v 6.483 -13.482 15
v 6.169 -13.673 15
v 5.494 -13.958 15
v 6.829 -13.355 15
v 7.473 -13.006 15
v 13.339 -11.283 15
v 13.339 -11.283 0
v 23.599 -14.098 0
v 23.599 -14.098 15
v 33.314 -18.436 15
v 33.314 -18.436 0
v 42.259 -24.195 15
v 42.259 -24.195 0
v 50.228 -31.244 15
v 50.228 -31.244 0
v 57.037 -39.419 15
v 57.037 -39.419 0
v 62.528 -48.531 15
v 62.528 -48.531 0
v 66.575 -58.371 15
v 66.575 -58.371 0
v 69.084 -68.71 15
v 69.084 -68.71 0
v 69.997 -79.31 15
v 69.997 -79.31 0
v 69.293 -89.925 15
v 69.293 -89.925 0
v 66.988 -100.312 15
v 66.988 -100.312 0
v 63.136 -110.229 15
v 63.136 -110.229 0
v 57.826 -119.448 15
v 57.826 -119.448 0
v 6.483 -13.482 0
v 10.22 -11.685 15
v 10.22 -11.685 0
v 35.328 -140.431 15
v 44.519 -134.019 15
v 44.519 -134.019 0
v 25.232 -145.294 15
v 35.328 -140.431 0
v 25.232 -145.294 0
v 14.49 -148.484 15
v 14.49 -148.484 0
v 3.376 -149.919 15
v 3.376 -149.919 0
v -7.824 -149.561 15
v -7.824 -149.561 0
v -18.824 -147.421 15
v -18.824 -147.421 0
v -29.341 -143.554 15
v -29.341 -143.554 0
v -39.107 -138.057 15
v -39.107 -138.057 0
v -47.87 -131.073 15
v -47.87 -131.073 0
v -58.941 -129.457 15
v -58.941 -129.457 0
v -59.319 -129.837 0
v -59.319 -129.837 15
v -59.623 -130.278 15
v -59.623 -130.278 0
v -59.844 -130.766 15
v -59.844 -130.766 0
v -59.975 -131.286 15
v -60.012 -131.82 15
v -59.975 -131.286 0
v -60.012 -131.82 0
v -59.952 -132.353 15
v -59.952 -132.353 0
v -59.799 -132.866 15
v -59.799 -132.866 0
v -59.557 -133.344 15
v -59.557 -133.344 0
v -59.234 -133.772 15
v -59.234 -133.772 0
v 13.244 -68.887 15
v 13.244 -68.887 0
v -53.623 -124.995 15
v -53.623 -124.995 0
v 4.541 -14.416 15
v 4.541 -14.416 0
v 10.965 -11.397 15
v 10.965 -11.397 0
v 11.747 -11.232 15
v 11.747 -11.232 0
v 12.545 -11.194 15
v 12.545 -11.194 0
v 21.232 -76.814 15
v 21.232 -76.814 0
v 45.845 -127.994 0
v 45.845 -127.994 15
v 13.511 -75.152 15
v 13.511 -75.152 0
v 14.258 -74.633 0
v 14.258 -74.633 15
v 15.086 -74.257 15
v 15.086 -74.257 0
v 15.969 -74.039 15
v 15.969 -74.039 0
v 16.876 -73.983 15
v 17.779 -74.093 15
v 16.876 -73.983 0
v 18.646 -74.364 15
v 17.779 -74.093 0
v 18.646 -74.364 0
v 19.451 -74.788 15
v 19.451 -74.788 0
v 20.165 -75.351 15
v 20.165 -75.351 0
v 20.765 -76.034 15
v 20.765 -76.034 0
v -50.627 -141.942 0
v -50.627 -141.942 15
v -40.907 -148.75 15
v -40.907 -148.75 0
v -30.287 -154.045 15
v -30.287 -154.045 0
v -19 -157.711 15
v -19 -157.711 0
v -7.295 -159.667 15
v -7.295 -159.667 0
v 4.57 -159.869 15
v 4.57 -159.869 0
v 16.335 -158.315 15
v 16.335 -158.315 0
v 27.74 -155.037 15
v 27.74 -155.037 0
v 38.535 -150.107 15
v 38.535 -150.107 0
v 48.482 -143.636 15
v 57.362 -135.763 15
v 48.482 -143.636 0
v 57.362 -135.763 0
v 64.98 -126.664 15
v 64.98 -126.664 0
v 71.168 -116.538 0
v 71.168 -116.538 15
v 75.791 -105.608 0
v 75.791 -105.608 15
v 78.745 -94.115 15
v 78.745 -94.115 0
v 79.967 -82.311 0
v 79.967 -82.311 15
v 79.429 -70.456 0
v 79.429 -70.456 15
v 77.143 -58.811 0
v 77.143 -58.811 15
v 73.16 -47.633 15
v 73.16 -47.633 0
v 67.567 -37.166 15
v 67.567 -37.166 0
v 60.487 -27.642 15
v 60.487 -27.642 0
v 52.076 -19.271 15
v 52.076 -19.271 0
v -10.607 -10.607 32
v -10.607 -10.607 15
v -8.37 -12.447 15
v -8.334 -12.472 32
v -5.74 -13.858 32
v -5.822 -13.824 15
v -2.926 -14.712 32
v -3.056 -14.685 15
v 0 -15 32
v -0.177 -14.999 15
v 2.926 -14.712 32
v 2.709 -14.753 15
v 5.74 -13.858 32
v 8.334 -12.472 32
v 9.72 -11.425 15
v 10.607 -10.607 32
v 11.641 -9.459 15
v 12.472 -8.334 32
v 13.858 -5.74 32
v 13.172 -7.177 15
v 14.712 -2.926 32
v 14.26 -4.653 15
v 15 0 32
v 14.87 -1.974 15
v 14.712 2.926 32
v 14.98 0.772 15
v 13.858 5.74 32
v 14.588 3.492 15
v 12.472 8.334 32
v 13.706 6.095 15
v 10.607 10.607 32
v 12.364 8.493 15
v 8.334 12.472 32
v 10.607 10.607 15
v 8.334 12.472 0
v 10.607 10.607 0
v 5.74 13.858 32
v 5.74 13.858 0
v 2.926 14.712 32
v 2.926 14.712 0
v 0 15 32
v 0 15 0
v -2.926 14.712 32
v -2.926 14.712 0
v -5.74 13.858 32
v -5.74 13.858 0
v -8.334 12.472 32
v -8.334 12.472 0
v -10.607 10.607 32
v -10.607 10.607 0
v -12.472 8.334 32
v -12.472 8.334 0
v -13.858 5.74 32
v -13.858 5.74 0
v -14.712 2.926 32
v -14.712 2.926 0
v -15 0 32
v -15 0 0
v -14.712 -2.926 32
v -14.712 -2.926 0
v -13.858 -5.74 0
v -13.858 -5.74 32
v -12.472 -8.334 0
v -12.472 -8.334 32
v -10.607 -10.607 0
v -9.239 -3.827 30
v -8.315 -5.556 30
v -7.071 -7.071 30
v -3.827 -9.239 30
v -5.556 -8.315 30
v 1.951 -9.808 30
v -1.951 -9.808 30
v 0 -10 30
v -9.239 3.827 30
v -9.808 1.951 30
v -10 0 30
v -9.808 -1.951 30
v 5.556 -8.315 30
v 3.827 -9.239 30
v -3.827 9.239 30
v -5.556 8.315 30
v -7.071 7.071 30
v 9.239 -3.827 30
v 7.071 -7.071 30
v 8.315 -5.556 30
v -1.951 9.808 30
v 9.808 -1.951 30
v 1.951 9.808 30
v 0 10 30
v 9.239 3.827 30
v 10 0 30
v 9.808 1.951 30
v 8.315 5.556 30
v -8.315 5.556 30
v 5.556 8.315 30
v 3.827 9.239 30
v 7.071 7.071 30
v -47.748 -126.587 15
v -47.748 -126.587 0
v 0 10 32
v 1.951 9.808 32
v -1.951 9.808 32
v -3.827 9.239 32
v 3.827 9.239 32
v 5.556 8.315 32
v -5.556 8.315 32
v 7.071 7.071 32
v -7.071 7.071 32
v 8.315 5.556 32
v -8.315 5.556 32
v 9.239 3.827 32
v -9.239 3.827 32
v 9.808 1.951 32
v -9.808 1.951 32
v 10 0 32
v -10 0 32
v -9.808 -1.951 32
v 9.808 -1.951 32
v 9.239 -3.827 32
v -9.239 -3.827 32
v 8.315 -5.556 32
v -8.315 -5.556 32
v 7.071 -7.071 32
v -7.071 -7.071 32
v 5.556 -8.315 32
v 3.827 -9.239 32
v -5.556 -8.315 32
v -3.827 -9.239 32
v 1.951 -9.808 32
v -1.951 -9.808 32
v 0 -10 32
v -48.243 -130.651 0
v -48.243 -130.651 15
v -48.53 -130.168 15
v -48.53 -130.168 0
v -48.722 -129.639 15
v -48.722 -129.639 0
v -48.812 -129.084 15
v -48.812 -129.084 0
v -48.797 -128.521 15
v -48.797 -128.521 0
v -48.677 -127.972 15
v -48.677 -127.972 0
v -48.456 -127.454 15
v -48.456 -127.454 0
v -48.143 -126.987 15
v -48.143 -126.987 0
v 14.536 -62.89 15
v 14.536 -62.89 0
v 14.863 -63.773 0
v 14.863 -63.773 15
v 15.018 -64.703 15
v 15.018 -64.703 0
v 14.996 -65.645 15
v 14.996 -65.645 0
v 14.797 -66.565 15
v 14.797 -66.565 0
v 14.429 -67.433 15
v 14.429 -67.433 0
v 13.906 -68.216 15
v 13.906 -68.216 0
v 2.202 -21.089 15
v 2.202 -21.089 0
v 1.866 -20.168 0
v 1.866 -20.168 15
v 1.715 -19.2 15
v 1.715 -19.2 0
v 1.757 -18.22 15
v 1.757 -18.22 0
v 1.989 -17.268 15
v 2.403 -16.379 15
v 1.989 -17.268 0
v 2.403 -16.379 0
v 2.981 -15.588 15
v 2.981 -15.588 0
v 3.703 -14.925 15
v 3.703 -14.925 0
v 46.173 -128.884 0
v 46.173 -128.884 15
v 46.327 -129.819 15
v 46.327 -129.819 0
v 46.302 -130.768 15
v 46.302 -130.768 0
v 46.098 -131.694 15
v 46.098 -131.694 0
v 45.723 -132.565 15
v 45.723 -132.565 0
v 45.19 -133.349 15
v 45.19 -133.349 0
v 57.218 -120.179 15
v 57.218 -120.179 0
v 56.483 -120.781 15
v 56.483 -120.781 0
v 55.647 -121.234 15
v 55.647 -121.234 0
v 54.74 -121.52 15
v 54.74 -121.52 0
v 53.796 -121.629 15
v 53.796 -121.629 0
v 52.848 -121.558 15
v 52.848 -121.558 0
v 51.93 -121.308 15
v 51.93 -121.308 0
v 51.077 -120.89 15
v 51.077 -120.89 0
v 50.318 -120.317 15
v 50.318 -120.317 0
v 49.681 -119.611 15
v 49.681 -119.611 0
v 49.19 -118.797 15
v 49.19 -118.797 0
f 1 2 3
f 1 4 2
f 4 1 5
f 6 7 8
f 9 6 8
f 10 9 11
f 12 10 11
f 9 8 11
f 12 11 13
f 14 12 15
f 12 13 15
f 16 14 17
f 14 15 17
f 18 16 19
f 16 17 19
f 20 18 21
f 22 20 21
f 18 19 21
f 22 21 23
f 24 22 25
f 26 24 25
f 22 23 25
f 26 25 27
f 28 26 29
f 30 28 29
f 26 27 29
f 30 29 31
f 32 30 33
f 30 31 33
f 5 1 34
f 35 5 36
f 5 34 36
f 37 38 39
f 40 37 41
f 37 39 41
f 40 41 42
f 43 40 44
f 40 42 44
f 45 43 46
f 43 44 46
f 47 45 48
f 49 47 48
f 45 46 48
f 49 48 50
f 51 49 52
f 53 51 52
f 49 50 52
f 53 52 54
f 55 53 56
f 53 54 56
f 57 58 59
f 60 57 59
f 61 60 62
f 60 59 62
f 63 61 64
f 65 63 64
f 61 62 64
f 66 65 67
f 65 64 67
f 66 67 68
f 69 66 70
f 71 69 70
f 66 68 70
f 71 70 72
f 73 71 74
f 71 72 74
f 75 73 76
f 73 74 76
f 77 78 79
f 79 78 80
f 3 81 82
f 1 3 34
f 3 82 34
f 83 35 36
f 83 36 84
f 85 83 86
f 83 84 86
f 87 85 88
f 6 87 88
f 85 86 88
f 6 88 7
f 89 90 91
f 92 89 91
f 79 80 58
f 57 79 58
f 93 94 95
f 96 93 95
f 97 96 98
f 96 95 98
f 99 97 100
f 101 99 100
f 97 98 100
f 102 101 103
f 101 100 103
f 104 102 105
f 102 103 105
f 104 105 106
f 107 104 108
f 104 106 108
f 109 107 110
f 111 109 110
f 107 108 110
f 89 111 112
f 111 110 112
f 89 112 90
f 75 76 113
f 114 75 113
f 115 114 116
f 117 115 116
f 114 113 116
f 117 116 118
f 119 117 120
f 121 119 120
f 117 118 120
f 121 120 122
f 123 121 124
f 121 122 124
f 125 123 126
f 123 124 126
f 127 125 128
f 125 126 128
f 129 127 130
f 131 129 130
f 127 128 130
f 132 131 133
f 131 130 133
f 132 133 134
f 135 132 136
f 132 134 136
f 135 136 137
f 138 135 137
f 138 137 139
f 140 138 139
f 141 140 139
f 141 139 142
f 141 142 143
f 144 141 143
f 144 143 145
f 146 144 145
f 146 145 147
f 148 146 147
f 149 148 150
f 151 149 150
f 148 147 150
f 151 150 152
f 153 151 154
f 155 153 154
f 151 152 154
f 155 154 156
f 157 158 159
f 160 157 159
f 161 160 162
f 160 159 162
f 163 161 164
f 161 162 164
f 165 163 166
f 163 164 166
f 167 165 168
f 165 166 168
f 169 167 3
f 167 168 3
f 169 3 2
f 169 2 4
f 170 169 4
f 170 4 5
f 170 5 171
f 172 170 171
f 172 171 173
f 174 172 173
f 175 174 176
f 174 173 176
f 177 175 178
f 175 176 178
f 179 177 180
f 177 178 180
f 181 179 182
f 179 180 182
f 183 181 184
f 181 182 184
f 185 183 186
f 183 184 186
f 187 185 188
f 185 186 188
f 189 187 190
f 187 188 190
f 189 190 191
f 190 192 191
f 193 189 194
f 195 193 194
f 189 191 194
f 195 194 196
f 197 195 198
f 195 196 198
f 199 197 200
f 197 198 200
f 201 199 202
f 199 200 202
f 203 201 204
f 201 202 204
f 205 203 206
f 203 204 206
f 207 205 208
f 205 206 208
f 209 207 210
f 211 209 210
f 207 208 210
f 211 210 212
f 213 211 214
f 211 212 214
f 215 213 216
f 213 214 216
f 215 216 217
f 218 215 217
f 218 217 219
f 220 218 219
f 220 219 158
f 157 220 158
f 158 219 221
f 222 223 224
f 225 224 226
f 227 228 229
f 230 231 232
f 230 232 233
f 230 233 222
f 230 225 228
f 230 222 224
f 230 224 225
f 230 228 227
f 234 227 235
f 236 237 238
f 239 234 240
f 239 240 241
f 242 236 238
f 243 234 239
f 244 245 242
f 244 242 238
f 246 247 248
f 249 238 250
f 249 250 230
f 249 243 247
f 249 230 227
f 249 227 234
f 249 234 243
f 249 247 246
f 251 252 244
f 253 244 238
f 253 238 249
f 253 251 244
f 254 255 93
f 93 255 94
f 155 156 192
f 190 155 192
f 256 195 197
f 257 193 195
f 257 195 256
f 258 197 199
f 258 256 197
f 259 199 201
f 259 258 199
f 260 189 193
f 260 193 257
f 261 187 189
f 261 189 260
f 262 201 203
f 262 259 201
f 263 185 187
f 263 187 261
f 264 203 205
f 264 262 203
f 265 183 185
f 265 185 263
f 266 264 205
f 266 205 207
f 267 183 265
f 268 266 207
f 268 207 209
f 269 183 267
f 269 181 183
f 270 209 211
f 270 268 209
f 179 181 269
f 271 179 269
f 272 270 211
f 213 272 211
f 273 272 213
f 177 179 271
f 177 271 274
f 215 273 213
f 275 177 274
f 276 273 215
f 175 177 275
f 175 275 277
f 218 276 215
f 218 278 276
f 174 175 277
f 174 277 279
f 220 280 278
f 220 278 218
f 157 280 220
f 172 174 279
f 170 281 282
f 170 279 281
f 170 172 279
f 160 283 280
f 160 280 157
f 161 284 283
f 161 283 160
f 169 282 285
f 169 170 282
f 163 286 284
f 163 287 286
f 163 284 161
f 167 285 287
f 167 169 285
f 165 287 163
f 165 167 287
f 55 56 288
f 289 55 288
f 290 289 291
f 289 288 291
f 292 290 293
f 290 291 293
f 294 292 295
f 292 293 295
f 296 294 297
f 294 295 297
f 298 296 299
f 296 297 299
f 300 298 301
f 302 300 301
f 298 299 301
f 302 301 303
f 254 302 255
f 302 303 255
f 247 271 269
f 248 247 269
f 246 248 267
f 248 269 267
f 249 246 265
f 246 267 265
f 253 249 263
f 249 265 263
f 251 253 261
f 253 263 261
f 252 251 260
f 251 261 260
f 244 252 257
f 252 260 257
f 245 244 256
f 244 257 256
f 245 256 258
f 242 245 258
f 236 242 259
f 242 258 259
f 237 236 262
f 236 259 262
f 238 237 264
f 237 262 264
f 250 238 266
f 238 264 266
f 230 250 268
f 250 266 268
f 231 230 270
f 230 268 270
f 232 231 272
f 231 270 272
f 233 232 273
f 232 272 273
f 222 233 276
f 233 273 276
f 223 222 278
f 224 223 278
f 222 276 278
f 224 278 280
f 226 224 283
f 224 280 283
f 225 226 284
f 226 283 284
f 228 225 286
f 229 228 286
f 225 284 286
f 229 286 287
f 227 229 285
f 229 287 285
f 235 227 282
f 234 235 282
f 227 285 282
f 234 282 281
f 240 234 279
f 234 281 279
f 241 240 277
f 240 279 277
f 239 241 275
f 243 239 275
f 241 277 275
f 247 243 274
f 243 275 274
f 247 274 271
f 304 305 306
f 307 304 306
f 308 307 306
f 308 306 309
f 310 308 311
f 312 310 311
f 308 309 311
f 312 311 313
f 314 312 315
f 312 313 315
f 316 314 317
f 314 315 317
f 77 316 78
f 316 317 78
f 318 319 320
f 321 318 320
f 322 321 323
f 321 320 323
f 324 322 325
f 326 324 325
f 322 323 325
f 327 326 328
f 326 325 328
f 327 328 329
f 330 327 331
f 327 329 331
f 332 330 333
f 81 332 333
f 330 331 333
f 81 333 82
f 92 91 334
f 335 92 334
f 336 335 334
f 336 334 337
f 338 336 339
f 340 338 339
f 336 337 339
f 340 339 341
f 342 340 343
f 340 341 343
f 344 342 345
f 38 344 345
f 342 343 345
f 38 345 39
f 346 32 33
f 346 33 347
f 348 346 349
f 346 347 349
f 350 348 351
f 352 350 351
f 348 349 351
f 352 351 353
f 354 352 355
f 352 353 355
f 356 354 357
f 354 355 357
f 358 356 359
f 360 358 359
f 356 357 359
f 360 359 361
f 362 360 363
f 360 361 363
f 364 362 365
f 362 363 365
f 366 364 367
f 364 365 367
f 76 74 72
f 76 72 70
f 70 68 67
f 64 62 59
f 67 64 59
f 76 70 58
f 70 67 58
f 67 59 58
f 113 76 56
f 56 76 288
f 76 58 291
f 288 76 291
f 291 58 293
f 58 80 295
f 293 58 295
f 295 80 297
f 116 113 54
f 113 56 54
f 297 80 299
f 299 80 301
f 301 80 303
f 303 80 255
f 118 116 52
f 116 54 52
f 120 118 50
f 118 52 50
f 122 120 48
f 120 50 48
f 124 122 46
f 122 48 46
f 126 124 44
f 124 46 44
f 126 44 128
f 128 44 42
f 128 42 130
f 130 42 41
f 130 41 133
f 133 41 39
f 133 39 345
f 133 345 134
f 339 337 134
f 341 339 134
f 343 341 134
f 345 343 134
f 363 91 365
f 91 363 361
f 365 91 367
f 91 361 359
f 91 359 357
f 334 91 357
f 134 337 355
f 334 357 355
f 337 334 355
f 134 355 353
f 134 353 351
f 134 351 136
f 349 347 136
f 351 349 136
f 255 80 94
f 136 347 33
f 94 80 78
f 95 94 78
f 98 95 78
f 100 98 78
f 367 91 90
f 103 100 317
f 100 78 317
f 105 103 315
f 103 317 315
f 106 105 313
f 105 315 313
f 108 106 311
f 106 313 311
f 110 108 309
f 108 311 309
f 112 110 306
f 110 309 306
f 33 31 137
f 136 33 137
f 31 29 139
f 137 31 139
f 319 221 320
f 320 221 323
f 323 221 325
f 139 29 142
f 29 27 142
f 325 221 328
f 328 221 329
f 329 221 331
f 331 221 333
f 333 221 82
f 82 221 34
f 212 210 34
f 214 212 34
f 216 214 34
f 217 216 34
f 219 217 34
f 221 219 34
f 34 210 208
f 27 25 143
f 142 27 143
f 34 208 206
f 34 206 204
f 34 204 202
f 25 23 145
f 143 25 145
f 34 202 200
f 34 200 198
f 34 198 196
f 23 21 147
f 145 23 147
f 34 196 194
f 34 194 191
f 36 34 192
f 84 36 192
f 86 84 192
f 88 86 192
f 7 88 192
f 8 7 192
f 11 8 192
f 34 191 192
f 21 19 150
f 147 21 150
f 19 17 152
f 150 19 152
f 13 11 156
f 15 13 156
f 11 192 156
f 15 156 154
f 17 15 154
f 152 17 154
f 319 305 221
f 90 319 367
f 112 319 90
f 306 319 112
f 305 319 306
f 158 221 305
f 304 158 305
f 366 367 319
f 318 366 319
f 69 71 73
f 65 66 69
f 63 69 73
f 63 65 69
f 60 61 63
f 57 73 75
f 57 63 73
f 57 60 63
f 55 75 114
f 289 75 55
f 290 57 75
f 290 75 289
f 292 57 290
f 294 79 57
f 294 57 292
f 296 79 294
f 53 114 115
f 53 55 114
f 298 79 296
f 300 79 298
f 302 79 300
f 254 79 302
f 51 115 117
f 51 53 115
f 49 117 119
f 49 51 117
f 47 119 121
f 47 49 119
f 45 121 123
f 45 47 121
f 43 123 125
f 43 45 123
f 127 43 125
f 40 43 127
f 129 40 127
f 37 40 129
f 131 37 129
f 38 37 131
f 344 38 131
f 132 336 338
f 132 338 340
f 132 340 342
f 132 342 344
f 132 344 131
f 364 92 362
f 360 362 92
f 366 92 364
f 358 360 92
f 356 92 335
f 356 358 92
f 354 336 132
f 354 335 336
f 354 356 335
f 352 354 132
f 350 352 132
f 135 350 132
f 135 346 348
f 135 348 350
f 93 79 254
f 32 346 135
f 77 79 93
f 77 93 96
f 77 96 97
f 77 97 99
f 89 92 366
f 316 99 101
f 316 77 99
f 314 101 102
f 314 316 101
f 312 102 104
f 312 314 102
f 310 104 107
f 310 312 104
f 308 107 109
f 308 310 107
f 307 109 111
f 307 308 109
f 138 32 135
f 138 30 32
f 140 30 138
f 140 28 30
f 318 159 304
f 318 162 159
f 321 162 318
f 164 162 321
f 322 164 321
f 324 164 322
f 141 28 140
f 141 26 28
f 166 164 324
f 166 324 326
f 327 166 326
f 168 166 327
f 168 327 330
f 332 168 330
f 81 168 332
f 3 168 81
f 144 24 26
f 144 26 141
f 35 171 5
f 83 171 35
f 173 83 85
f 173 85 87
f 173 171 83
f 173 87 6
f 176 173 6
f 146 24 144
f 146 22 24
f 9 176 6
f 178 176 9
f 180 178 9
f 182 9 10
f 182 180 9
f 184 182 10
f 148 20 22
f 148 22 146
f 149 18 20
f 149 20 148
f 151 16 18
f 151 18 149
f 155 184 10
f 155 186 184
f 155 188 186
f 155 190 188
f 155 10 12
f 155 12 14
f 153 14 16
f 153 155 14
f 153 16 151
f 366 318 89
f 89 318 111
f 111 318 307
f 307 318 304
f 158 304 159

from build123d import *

# Parameters (mm, degrees)
EXTRUDE_1_DEPTH     = 15
CUT_EXTRUDE_START   = -15
CUT_EXTRUDE_1_DEPTH = 15
SKETCH_9_R          = 15
EXTRUDE_2_DEPTH     = 17
SKETCH_10_R         = 10
CUT_EXTRUDE_4_DEPTH = 2


with BuildPart() as part:
    # ｽｹｯﾁ4 → ﾎﾞｽ - 押し出し1 (new body)
    with BuildSketch(Plane.XY):
        with BuildLine():
            Line((-53.623111018, -124.995132678), (-58.940636287, -129.45706617))
            ThreePointArc((-58.940636287, -129.45706617), (-60.005384698, -131.552012131), (-59.233530865, -133.771635843))
            ThreePointArc((-59.233530865, -133.771635843), (57.362306223, -135.763481103), (52.076178918, -19.270504783))
            Line((52.076178918, -19.270504783), (10.606601718, 10.606601718))
            ThreePointArc((10.606601718, 10.606601718), (-10.606601718, 10.606601718), (-10.606601718, -10.606601718))
            Line((-10.606601718, -10.606601718), (14.536280154, -62.889638219))
            ThreePointArc((14.536280154, -62.889638219), (14.918089499, -66.109676181), (13.244185189, -68.886809092))
            Line((13.244185189, -68.886809092), (-53.623111018, -124.995132678))
        make_face()
        with BuildLine():
            Line((21.232400696, -76.813798404), (45.844843506, -127.993820346))
            ThreePointArc((45.844843506, -127.993820346), (46.221944165, -131.235480845), (44.518718993, -134.019289696))
            ThreePointArc((44.518718993, -134.019289696), (-2.231208213, -149.964431749), (-47.870174388, -131.072951785))
            ThreePointArc((-47.870174388, -131.072951785), (-48.817477846, -128.802229421), (-47.747678417, -126.586582094))
            Line((-47.747678417, -126.586582094), (13.511229465, -75.151532228))
            ThreePointArc((13.511229465, -75.151532228), (17.77869109, -74.092739753), (21.232400696, -76.813798404))
        make_face(mode=Mode.SUBTRACT)
    extrude(amount=EXTRUDE_1_DEPTH)

    # ｽｹｯﾁ6 → ｶｯﾄ - 押し出し1 (cut)
    with BuildSketch(Plane.XY.offset(15).offset(CUT_EXTRUDE_START)):
        with BuildLine():
            Line((49.189589797, -118.797265215), (2.201751786, -21.089020696))
            ThreePointArc((2.201751786, -21.089020696), (1.989274209, -17.268089629), (4.540836142, -14.416039025))
            Line((4.540836142, -14.416039025), (6.483415605, -13.48185369))
            Line((6.483415605, -13.48185369), (10.219658847, -11.685096486))
            ThreePointArc((10.219658847, -11.685096486), (11.747077013, -11.232198087), (13.339423466, -11.282754846))
            ThreePointArc((13.339423466, -11.282754846), (64.738421392, -53.37413296), (57.826055334, -119.448033215))
            ThreePointArc((57.826055334, -119.448033215), (53.319931874, -121.616182211), (49.189589797, -118.797265215))
        make_face()
    extrude(amount=CUT_EXTRUDE_1_DEPTH, mode=Mode.SUBTRACT)

    # ｽｹｯﾁ9 → ﾎﾞｽ - 押し出し2 (add)
    with BuildSketch(Plane.XY.offset(15)):
        with Locations(Location((0, 0, 0), (0, 0, 225))):
            Circle(SKETCH_9_R)
    extrude(amount=EXTRUDE_2_DEPTH)

    # ｽｹｯﾁ10 → ｶｯﾄ - 押し出し4 (cut)
    with BuildSketch(Plane.XY.offset(32)):
        Circle(SKETCH_10_R)
    extrude(amount=-CUT_EXTRUDE_4_DEPTH, mode=Mode.SUBTRACT)


solid = part.part
